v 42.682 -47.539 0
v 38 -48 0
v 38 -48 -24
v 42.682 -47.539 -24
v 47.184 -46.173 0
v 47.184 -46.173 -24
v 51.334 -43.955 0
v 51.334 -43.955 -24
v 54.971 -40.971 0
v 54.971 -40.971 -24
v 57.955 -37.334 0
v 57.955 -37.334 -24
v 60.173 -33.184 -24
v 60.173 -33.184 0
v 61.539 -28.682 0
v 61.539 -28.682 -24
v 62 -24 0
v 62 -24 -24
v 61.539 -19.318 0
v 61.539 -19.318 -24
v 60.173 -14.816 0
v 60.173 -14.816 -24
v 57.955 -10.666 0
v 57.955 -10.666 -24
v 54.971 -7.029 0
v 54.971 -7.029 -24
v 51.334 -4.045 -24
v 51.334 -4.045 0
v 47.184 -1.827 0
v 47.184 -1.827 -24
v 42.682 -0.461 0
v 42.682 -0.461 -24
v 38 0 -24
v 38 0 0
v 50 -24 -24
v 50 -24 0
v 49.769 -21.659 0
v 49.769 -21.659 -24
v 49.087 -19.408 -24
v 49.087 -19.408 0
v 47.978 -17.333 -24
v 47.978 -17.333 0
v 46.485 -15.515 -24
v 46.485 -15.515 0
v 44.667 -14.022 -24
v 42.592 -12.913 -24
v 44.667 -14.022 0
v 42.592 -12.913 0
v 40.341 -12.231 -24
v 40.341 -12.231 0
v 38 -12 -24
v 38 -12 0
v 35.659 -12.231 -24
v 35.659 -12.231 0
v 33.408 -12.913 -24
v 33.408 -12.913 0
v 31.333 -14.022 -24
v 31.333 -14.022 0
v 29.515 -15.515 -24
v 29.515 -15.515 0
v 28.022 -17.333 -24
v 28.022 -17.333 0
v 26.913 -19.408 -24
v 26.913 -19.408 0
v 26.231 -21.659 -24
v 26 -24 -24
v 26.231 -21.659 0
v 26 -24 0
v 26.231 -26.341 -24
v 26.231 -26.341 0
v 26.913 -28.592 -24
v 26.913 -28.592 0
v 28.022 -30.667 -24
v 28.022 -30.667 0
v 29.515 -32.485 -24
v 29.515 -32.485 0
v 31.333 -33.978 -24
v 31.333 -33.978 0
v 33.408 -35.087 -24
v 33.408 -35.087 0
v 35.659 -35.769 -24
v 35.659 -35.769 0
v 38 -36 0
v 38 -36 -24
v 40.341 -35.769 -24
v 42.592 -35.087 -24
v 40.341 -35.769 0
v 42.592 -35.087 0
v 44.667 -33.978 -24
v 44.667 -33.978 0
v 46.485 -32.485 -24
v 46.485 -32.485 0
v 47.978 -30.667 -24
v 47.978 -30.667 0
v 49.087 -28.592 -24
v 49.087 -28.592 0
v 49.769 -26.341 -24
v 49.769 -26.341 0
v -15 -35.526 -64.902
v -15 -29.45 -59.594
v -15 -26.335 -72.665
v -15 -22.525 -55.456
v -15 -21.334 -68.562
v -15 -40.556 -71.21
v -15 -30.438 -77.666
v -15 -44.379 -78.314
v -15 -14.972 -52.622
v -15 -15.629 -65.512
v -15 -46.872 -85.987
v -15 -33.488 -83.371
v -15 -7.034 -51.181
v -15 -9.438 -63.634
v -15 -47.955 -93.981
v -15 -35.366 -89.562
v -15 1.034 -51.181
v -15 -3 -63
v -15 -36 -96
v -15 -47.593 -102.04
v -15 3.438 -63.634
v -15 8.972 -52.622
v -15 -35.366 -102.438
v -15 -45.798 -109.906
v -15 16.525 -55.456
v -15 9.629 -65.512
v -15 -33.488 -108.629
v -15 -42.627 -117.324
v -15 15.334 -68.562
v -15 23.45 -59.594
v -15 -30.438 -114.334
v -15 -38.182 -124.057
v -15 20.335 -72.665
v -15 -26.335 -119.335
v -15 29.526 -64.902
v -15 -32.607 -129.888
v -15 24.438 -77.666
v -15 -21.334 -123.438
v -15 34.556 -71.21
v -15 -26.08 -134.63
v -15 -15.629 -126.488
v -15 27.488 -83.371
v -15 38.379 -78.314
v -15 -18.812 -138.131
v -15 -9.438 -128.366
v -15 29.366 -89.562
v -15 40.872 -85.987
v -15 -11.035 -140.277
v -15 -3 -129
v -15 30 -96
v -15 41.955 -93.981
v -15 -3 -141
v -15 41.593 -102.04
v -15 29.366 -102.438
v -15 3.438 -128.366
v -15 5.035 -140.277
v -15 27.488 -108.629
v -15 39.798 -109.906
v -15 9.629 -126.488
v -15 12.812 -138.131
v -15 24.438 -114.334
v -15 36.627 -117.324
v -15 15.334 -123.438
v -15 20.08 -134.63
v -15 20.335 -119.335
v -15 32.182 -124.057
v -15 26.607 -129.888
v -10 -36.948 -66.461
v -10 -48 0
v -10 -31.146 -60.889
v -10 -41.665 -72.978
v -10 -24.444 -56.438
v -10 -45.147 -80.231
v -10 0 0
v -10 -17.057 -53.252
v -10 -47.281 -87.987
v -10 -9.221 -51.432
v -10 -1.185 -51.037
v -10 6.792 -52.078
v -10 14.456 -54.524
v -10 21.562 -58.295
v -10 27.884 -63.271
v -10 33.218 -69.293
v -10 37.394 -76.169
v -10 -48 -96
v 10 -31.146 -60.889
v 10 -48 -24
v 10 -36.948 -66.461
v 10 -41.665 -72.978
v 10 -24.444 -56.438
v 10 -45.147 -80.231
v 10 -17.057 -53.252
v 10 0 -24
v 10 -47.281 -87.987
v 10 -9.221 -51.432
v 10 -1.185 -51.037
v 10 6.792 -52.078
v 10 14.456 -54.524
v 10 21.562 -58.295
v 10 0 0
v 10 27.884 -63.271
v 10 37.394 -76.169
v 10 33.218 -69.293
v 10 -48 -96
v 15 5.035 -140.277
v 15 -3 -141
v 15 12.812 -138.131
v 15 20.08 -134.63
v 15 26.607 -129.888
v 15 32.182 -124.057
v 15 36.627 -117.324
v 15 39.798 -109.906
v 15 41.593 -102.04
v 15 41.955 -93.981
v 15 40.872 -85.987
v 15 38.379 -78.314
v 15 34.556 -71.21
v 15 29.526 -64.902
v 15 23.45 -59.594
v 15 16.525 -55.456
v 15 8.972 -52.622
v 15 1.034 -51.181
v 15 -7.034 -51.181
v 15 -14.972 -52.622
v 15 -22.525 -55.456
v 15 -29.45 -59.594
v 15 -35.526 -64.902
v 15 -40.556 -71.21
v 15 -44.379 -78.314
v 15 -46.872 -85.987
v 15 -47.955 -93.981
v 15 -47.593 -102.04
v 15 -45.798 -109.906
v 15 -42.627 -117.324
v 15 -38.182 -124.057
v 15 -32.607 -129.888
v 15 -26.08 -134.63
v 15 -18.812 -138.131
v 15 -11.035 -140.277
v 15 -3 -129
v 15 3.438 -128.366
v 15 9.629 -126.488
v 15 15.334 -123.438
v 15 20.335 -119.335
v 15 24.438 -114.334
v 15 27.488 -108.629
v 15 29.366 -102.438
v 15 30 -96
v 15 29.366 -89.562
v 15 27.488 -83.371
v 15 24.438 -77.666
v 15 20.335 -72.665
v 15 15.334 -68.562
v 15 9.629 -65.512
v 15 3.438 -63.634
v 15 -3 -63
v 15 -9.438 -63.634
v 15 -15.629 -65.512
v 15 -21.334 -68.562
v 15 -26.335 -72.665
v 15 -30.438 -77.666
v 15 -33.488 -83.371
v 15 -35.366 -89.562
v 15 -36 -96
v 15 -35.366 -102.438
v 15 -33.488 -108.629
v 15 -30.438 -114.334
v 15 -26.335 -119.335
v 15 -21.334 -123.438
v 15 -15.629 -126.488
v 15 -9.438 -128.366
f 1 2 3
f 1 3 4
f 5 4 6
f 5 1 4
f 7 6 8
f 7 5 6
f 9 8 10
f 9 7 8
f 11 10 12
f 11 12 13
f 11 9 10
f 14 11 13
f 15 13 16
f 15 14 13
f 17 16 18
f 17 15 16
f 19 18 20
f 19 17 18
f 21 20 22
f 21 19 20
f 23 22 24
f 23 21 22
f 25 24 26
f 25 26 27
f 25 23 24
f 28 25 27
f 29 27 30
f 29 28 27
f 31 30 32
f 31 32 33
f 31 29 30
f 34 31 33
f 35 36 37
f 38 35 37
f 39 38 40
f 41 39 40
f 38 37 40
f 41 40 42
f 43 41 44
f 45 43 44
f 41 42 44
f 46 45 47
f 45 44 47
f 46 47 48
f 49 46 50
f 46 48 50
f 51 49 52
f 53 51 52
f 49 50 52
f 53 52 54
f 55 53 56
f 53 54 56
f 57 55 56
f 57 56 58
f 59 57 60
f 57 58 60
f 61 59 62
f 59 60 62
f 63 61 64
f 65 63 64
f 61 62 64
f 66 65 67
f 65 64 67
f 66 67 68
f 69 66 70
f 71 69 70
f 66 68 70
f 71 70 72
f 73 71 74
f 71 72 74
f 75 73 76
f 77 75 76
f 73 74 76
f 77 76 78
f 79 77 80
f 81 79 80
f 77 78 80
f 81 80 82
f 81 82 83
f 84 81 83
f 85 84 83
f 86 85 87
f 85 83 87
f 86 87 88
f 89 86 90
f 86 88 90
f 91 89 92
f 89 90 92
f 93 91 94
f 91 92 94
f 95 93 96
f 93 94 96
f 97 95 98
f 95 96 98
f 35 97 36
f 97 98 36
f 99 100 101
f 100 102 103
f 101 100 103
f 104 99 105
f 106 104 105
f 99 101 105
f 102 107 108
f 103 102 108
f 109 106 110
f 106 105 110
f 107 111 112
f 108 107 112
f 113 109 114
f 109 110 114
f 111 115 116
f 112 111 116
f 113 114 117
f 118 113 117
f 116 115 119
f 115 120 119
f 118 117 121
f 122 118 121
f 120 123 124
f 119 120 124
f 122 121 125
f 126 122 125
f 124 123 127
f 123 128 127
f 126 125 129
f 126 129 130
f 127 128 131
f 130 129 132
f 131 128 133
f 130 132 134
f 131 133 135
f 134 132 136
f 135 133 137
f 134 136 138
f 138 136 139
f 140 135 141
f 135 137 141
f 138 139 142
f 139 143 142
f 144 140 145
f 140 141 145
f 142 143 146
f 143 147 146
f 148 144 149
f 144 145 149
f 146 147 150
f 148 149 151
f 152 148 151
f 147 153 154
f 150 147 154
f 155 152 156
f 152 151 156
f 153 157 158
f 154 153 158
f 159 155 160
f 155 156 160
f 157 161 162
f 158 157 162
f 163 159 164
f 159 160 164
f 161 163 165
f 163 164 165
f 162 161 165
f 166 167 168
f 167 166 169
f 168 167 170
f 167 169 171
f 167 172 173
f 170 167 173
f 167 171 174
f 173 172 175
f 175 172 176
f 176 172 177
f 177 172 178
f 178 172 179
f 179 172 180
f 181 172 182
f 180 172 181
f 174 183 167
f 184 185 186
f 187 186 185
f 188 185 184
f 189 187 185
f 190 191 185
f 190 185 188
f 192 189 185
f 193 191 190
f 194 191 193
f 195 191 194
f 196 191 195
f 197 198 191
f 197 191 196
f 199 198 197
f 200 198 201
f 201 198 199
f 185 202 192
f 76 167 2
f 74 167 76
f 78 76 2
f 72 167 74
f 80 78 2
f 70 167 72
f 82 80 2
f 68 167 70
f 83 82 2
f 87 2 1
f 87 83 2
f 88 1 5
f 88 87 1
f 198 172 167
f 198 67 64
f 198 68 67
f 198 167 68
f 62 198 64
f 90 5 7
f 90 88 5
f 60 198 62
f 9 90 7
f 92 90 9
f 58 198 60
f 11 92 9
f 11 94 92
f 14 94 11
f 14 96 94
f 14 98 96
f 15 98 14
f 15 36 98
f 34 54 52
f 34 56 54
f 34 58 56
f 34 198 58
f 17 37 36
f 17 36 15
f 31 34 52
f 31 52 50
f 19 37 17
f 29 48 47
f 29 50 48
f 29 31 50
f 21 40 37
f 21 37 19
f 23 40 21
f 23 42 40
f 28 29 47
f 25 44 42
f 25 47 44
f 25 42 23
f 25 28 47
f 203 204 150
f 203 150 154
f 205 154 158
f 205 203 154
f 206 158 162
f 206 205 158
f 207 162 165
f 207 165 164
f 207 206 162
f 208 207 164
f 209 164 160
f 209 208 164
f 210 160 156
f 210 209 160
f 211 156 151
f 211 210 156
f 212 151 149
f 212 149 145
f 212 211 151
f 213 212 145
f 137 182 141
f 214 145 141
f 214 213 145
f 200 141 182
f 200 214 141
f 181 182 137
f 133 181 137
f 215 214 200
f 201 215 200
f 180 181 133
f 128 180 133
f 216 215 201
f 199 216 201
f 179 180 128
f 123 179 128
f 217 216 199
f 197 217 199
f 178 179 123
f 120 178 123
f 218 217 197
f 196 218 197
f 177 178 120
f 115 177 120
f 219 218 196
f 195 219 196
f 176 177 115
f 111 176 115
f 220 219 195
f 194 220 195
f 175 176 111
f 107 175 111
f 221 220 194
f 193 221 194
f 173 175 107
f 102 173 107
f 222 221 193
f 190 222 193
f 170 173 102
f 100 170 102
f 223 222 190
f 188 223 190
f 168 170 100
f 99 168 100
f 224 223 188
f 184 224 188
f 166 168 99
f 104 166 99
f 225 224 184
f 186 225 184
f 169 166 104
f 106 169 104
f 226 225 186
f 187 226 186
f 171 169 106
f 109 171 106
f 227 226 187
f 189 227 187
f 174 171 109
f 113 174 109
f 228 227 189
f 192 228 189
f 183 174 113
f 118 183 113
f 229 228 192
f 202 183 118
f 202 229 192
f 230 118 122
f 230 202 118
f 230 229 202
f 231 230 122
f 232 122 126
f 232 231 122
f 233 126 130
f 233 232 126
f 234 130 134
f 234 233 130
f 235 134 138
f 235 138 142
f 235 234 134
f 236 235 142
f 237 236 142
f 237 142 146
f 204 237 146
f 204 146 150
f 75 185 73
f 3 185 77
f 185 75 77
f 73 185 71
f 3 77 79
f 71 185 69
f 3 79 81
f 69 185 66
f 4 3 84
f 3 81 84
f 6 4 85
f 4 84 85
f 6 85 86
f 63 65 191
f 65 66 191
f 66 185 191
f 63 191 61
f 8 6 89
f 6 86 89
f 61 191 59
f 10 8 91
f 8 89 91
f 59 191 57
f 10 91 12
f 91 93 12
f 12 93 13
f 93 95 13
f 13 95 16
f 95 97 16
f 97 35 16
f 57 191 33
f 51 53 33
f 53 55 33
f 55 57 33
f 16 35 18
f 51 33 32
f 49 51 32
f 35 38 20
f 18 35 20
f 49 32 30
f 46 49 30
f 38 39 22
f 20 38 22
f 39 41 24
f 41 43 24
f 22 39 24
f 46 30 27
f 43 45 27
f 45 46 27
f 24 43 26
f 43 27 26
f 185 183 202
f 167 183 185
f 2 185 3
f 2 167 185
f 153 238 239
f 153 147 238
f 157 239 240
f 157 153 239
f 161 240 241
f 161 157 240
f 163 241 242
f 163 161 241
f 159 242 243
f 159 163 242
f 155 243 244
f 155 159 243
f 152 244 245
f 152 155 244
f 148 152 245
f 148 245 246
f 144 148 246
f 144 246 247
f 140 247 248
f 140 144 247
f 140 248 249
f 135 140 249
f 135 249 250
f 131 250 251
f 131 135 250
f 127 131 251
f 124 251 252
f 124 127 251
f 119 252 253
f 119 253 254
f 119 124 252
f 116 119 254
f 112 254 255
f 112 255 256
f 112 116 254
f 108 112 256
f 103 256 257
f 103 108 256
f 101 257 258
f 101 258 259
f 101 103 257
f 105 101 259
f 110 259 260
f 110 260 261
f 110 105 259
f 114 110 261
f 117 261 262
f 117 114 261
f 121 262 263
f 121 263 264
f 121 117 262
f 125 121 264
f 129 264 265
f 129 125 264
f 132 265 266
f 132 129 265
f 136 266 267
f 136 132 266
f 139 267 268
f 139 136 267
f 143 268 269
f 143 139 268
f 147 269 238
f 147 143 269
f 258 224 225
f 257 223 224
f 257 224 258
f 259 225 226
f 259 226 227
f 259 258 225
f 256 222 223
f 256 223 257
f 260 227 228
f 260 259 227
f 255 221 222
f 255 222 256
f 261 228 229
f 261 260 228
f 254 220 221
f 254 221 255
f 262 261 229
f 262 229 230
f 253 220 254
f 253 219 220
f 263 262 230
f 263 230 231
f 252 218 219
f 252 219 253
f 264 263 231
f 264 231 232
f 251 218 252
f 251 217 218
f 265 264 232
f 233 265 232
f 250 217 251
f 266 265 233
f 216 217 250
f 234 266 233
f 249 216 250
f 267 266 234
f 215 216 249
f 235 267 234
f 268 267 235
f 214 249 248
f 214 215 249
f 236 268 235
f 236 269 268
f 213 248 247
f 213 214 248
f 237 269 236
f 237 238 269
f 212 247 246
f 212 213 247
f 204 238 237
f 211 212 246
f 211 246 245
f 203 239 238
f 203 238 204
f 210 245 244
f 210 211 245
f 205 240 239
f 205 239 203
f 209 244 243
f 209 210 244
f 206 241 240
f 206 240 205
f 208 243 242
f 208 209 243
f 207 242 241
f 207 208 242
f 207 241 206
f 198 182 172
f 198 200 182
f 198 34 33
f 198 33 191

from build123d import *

# Parameters (mm, degrees)
EXTRUDE_1_DEPTH = 10
SKETCH_1_4_R    = 33.000000000000014
EXTRUDE_2_DEPTH = 15
SKETCH_2_R      = 12.000000000000005
EXTRUDE_3_DEPTH = 24


with BuildPart() as part:
    # 草圖1 → 填料-伸長1 (new, symmetric)
    with BuildSketch(Plane(origin=(0, 0, 0), x_dir=(0, 0, -1), z_dir=(1, 0, 0))):
        with BuildLine():
            Line((76.16857776208369, 37.394488386678184), (0, 0))
            Line((0, 0), (5.88e-15, -48))
            Line((5.88e-15, -48), (96, -48.00000000000001))
            ThreePointArc((95.99999999999999, -48.00000000000002), (52.166496960655074, -13.179587972985), (76.16857776208367, 37.39448838667819))
        make_face()
    extrude(amount=EXTRUDE_1_DEPTH, both=True)

    # 草圖1<4> → 填料-伸長2 (add, symmetric)
    with BuildSketch(Plane(origin=(0, 0, 0), x_dir=(0, 0, -1), z_dir=(1, 0, 0))):
        with BuildLine():
            ThreePointArc((141.00000000000003, -3.0000000000000027), (119.7969115568992, 35.19302292766466), (76.16857776208367, 37.39448838667819))
            ThreePointArc((76.16857776208367, 37.39448838667819), (52.166496960655074, -13.179587972985), (95.99999999999999, -48.00000000000002))
            ThreePointArc((95.99999999999999, -48.00000000000002), (127.81980515339464, -34.81980515339466), (141.00000000000003, -3.0000000000000138))
        make_face()
        with Locations((96, -3.0000000000000027)):
            Circle(SKETCH_1_4_R, mode=Mode.SUBTRACT)
    extrude(amount=EXTRUDE_2_DEPTH, both=True)

    # 草圖2 → 填料-伸長3 (add)
    with BuildSketch(Plane.XY):
        with BuildLine():
            Line((38, 0), (10, 0))
            Line((10, 0), (10, -48))
            Line((10, -48), (38, -48))
            ThreePointArc((38, -48), (62, -24), (38, 0))
        make_face()
        with Locations((38, -24)):
            Circle(SKETCH_2_R, mode=Mode.SUBTRACT)
    extrude(amount=-EXTRUDE_3_DEPTH)


solid = part.part
